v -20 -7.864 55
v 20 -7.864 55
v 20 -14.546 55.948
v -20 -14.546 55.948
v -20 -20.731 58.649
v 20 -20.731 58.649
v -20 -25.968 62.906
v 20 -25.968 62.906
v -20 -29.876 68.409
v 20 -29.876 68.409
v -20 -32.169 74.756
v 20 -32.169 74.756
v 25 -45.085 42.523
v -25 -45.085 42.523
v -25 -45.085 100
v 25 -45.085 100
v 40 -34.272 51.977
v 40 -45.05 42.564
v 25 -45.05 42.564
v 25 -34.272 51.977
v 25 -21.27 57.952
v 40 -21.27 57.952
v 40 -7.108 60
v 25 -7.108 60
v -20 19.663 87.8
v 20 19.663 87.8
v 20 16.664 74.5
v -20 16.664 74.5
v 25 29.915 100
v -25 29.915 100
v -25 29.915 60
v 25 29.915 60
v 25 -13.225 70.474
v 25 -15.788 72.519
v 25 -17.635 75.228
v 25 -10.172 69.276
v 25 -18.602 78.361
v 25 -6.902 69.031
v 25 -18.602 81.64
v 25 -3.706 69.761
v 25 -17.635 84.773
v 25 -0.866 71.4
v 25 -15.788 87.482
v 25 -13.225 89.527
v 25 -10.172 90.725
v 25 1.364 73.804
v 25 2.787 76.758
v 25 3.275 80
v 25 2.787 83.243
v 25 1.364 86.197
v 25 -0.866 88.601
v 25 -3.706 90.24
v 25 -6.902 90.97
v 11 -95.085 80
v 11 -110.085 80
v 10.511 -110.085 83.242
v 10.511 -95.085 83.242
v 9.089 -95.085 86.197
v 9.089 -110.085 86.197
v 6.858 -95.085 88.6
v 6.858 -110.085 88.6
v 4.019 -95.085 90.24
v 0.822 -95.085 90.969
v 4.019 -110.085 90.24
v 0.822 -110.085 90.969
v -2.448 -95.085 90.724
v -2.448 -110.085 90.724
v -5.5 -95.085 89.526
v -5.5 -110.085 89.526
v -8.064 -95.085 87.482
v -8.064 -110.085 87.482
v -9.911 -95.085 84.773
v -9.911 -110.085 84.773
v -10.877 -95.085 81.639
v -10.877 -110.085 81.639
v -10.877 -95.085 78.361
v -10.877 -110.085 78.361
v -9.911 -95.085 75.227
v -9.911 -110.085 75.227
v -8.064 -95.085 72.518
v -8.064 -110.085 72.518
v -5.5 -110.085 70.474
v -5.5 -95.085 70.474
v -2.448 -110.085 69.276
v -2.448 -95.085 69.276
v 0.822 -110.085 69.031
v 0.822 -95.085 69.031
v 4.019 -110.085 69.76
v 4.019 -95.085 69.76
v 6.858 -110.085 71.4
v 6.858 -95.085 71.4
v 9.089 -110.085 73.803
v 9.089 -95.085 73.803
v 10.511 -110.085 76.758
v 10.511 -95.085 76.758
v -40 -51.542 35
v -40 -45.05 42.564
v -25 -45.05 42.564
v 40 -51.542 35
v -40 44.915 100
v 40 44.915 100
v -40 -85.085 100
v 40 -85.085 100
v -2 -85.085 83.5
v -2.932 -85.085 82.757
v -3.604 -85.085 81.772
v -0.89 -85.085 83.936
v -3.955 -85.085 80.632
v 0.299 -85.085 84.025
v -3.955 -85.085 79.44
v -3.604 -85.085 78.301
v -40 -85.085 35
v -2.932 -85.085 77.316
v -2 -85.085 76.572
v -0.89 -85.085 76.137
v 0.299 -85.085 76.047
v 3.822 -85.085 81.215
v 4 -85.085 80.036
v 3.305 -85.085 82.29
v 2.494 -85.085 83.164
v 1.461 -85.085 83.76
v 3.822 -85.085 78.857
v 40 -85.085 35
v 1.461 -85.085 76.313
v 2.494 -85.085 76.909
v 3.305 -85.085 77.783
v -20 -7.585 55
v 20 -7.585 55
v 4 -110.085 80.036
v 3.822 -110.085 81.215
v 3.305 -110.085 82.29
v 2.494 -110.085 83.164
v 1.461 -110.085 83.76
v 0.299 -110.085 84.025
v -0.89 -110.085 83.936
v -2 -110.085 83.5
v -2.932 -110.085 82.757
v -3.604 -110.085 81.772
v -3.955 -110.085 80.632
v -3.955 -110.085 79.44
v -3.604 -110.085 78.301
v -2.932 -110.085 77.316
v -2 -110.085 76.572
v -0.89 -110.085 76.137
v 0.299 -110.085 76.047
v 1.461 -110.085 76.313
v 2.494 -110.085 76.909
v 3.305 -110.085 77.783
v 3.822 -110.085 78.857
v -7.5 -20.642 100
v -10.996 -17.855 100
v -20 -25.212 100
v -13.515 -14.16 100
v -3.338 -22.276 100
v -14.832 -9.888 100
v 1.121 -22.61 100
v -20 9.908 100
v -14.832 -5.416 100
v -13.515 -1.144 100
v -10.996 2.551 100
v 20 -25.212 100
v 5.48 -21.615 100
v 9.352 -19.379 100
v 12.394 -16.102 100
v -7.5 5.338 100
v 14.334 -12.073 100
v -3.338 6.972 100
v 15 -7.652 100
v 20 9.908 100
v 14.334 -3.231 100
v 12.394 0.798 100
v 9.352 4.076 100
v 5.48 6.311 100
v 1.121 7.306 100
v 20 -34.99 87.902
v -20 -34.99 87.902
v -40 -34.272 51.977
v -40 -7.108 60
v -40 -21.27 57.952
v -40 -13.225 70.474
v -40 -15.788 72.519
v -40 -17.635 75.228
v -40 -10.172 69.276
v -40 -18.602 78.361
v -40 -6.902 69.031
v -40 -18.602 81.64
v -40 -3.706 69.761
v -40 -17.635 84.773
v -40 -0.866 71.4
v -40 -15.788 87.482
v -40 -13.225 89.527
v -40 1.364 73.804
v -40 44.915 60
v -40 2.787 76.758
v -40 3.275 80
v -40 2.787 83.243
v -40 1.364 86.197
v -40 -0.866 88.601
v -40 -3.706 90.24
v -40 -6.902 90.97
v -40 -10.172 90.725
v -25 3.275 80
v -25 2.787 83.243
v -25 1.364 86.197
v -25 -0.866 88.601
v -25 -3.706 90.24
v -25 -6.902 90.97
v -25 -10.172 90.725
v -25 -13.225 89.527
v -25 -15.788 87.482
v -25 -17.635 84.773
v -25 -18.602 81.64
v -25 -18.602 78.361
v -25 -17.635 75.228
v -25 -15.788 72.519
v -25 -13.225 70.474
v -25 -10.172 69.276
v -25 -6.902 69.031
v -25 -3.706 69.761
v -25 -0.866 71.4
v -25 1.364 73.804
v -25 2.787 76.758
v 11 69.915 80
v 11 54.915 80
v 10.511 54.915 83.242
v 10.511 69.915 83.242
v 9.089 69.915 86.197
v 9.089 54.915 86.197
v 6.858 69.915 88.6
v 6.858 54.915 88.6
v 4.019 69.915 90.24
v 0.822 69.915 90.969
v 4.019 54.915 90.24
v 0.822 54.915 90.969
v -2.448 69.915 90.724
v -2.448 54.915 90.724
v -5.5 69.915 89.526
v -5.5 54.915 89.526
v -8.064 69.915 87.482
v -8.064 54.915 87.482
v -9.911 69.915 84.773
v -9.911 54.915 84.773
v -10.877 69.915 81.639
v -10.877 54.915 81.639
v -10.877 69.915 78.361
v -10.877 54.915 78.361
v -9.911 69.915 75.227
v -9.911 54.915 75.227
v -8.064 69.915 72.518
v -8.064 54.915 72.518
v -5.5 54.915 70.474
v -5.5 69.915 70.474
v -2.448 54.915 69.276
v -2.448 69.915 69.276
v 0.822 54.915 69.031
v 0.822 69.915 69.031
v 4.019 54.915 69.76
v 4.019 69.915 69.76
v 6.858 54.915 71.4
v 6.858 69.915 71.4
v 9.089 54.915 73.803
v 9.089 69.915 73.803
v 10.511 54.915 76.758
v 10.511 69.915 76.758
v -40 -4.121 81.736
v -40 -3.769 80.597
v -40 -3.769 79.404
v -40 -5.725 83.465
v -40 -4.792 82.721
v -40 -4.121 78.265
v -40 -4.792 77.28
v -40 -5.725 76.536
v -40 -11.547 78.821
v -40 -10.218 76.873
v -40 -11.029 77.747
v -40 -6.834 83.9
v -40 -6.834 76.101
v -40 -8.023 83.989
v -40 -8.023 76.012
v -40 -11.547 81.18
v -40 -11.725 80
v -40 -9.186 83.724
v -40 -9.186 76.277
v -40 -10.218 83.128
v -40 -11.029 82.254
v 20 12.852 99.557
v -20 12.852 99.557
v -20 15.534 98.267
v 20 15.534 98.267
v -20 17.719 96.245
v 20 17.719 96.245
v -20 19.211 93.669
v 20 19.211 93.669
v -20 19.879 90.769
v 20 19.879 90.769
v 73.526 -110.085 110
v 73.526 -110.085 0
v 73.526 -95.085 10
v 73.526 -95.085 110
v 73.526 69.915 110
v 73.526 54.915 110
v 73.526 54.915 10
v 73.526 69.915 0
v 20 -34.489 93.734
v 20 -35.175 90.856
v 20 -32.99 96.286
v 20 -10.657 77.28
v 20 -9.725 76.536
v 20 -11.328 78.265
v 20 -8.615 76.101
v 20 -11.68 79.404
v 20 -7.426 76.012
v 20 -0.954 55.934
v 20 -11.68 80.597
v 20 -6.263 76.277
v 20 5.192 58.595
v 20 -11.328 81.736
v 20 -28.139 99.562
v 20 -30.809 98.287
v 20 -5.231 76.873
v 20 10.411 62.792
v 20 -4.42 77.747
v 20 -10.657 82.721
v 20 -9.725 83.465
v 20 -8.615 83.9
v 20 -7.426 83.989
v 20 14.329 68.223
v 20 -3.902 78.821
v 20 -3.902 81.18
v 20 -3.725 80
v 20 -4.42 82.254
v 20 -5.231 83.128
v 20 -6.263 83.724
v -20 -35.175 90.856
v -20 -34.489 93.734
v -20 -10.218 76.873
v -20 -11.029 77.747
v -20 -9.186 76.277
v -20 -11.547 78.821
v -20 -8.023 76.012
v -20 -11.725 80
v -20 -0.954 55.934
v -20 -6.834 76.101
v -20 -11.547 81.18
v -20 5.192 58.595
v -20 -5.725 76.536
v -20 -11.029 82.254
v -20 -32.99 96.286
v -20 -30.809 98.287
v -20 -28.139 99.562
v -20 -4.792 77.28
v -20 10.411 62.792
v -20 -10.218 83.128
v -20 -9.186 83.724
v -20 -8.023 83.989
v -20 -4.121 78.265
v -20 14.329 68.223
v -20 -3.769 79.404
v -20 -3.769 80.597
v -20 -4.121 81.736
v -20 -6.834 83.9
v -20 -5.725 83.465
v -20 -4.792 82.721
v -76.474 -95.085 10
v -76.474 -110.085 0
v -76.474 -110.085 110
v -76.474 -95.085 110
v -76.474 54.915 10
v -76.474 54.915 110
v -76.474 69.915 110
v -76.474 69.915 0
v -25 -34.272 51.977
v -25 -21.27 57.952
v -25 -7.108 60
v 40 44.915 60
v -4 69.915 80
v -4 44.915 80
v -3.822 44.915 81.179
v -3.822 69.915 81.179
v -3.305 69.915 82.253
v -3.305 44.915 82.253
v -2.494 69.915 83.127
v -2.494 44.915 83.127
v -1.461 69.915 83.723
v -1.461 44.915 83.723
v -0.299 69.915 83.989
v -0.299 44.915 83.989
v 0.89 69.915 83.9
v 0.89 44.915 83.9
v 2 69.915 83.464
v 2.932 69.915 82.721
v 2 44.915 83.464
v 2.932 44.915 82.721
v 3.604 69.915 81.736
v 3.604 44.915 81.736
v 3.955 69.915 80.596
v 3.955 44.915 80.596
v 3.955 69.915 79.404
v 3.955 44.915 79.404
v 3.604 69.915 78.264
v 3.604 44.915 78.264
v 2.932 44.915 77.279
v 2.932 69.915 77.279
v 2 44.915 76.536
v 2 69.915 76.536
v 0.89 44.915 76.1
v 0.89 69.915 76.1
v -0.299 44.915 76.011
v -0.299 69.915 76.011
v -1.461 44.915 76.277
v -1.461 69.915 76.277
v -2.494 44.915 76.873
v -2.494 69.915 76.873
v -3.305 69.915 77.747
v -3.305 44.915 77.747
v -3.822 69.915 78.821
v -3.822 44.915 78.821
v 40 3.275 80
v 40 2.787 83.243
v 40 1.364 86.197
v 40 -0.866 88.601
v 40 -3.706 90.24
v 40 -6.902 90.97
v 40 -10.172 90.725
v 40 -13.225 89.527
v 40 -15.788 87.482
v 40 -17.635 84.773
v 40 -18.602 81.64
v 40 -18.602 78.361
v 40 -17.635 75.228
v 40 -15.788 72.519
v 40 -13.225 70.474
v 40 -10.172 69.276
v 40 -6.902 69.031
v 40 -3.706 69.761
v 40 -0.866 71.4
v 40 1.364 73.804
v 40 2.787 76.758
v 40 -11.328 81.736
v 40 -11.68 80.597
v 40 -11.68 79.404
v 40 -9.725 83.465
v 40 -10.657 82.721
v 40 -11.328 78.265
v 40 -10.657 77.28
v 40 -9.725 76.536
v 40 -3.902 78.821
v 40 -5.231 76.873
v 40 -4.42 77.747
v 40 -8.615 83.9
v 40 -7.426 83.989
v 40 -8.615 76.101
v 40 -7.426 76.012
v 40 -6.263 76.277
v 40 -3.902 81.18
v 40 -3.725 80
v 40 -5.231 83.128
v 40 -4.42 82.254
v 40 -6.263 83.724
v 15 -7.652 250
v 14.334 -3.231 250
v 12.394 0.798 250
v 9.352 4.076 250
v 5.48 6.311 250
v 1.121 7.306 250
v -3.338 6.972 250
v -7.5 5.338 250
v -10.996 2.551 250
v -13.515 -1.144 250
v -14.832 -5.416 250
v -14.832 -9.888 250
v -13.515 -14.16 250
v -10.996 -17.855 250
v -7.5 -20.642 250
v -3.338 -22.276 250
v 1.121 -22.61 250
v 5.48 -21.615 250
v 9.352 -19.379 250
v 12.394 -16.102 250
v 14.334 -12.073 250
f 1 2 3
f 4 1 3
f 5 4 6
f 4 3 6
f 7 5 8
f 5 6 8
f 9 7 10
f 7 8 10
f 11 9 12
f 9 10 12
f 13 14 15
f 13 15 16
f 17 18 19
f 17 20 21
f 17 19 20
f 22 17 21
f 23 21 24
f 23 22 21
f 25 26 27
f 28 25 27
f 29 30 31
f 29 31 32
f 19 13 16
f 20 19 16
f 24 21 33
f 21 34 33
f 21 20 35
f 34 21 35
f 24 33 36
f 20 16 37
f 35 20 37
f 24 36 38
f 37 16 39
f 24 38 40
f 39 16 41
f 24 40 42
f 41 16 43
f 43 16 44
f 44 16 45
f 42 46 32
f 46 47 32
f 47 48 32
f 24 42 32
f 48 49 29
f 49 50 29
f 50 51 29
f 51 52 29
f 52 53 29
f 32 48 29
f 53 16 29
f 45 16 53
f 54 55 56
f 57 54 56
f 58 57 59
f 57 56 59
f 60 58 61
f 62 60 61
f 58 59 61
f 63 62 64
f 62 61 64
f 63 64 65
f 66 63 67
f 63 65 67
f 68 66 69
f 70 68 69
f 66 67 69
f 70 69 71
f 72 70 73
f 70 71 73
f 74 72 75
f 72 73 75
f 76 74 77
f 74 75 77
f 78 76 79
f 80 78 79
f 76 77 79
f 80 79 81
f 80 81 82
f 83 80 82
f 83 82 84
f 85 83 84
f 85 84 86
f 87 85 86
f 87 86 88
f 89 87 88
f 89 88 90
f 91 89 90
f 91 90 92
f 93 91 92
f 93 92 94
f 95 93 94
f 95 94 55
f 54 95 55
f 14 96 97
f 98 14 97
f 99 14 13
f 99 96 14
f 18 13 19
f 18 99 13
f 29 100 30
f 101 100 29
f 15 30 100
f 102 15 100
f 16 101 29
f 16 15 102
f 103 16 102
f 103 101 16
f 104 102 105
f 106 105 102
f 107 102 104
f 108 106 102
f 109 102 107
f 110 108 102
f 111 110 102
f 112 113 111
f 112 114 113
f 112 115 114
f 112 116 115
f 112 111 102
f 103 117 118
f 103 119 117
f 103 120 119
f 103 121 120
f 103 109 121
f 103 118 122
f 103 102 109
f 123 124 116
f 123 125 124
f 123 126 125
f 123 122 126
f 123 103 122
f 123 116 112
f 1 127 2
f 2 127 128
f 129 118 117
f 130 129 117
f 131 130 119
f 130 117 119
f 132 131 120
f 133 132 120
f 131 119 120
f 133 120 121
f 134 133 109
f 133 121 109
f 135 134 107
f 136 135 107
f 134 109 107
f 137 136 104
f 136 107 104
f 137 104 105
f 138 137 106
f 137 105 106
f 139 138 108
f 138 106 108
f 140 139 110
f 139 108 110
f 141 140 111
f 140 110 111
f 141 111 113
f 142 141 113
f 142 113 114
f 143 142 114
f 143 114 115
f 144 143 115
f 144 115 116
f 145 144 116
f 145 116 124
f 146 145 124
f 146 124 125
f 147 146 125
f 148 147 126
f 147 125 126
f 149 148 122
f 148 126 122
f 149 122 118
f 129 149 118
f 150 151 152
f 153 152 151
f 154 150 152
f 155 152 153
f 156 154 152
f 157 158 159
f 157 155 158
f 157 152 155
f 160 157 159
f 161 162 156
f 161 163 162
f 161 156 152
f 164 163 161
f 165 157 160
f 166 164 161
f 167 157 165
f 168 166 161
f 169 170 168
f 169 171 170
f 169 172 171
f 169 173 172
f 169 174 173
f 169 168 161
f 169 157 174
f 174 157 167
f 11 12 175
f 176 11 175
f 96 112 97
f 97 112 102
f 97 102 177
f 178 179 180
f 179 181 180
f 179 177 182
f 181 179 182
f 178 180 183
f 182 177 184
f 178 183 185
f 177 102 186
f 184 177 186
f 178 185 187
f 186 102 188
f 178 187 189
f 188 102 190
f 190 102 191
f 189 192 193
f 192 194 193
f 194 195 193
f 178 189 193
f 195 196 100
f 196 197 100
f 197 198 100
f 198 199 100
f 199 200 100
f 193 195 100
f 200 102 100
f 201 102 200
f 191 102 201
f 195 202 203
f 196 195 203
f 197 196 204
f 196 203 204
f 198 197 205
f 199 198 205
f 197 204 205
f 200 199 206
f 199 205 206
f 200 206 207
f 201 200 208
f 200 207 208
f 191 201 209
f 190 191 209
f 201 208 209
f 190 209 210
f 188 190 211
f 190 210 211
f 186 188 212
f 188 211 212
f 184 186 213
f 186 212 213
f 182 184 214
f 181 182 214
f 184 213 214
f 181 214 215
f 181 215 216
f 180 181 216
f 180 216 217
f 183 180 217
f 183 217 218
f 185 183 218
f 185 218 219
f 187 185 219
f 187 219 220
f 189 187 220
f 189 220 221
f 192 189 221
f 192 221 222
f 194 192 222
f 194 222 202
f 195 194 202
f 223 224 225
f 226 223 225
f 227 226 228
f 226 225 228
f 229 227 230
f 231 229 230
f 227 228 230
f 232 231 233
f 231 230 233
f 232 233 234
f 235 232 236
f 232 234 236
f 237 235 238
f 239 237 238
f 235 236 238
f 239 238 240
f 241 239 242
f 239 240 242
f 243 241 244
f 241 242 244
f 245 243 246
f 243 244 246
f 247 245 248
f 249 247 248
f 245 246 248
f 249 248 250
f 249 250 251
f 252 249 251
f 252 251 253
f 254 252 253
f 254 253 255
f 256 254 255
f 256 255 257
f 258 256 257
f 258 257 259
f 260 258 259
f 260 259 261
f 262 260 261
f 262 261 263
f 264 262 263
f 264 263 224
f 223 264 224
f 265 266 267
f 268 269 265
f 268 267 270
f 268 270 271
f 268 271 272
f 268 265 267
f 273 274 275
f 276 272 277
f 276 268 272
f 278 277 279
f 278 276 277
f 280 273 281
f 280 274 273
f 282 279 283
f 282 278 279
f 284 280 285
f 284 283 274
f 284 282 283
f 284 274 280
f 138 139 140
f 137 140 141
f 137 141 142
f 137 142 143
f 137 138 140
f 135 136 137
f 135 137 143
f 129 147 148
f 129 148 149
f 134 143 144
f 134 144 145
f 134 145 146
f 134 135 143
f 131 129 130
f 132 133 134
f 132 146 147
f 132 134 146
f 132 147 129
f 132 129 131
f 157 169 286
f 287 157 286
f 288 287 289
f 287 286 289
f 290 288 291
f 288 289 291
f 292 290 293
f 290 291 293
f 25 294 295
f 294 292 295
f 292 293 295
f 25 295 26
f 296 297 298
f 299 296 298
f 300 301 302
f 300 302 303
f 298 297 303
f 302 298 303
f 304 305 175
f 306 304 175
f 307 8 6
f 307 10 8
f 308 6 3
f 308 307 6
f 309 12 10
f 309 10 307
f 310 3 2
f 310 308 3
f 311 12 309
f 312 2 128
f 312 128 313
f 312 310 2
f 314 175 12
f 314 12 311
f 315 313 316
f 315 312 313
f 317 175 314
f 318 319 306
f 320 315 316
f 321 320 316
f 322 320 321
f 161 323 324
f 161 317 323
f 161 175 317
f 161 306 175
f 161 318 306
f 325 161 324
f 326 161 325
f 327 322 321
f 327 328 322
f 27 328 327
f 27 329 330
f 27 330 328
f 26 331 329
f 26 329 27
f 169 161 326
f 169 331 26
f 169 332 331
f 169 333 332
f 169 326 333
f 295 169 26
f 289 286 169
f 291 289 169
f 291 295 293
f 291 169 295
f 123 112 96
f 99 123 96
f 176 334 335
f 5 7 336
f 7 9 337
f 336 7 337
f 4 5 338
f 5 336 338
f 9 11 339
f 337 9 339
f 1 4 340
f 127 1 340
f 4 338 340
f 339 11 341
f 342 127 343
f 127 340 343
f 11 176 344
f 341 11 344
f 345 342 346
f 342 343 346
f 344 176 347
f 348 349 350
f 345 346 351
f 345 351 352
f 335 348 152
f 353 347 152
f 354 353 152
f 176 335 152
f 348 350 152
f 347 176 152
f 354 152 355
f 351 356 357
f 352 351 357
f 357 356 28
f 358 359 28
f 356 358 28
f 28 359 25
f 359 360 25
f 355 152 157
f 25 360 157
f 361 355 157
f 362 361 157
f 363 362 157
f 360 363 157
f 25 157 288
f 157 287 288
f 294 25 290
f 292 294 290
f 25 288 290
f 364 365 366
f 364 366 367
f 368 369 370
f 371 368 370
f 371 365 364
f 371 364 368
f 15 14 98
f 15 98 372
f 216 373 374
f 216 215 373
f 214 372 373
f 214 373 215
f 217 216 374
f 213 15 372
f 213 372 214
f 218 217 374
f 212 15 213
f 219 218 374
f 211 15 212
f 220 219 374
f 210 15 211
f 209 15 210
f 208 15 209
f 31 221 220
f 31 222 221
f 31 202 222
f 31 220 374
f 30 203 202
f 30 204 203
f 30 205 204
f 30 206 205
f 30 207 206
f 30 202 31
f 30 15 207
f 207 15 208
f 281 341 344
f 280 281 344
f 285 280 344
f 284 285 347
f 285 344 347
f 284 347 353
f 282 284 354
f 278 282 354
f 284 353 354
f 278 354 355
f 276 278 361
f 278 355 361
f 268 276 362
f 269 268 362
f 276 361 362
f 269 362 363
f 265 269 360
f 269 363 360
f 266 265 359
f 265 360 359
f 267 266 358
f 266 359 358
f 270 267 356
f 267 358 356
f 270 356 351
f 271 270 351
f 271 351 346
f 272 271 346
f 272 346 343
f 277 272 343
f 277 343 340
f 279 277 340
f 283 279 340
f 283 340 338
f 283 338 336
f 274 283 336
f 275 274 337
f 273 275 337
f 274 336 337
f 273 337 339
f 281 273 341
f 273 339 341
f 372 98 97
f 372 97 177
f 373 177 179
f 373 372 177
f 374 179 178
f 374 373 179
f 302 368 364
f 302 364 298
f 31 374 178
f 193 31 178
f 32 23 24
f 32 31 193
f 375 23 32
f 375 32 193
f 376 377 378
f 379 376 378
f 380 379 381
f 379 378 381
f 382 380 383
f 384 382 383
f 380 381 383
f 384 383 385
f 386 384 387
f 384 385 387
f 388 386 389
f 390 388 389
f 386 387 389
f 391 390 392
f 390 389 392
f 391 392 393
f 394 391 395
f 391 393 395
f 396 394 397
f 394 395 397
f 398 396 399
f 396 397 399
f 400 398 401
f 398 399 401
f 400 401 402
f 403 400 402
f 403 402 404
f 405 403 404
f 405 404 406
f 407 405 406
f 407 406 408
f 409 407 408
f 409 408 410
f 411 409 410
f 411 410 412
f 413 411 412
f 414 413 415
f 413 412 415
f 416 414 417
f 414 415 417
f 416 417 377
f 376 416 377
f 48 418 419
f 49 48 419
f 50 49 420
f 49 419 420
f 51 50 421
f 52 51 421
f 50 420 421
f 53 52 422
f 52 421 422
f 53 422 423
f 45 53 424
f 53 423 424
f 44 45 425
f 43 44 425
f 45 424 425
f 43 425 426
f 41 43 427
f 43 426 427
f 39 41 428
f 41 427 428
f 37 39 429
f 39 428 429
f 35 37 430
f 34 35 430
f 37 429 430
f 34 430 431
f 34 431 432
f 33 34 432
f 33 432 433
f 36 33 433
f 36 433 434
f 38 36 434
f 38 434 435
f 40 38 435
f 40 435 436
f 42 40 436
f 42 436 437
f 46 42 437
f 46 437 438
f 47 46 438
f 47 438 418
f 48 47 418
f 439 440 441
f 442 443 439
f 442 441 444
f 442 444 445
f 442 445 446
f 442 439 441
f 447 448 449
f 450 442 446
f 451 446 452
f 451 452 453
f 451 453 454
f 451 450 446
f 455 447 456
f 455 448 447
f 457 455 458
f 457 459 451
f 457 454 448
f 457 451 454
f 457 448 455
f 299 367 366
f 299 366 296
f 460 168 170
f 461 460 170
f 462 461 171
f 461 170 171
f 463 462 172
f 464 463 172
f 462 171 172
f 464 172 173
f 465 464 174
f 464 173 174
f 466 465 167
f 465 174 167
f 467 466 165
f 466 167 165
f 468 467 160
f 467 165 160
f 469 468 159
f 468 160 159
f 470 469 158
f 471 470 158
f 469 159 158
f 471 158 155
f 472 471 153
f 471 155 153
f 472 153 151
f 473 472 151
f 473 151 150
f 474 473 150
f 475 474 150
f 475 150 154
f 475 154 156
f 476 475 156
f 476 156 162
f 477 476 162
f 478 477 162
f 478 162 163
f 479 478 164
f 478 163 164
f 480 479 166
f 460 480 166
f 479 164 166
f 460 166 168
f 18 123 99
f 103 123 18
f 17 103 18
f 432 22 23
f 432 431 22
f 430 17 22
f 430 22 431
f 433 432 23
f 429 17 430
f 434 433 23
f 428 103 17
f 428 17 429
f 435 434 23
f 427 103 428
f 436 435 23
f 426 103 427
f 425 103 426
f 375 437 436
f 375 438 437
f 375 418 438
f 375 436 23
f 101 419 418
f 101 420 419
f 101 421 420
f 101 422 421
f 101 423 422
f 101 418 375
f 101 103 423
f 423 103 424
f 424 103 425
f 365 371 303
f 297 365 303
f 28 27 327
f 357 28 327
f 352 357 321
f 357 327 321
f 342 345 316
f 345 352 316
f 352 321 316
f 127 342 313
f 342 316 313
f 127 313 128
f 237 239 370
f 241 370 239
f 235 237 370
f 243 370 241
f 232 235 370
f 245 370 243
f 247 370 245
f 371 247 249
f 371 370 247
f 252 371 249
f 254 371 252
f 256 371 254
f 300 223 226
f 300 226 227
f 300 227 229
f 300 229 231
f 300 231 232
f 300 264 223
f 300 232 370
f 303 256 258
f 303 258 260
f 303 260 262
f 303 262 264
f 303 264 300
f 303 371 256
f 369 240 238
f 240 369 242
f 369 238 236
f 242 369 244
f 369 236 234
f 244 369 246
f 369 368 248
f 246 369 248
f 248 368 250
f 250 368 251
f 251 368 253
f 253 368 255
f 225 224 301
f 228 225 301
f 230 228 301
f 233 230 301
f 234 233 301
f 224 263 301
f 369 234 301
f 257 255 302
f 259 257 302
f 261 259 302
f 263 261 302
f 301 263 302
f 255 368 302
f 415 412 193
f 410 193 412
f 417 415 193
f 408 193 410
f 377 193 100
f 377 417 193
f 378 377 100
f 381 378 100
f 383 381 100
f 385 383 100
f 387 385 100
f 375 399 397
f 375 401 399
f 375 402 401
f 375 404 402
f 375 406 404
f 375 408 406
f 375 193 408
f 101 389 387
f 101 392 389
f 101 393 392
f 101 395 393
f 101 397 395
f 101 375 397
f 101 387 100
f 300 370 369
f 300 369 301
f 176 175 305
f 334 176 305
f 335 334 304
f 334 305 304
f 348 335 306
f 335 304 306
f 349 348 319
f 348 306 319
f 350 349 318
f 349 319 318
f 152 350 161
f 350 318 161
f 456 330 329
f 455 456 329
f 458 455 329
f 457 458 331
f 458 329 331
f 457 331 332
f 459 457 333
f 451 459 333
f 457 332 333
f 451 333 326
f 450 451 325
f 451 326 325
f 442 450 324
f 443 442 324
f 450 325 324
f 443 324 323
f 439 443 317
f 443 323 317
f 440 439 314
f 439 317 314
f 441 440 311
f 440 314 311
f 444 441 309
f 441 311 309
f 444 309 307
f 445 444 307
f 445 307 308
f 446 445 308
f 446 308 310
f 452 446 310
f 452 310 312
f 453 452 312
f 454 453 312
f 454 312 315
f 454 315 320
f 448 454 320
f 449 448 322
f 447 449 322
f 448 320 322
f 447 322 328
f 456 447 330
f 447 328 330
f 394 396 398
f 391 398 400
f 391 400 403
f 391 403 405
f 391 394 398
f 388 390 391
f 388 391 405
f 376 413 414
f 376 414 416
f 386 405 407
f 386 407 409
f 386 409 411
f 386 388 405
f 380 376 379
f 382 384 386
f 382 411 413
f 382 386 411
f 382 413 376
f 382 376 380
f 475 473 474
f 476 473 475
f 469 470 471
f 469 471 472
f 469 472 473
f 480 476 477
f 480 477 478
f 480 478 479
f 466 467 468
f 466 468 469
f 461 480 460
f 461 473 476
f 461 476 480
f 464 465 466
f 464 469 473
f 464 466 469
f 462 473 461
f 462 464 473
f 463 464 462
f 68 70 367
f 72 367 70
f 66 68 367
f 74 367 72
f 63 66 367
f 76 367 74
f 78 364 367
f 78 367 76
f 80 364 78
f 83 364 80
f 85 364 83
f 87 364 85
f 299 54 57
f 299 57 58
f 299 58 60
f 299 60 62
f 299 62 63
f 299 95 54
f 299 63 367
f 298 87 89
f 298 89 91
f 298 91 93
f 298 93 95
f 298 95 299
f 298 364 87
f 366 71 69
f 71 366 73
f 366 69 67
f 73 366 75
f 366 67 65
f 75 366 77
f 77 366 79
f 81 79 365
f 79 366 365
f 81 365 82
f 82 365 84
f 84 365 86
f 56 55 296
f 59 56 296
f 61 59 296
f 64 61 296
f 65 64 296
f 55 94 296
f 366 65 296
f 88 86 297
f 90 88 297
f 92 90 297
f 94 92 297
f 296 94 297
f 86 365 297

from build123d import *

# Parameters (mm, degrees)
F0_W      = 150
F0_H      = 180
F1_DEPTH  = 10
F2_W      = 150
F2_H      = 15
F3_DEPTH  = 100
F5_D      = 22
F7_DEPTH  = 40
F9_R      = 4
F10_DEPTH = 25
F11_R     = 4
F12_DEPTH = 25
F13_W     = 50
F13_H     = 75
F14_DEPTH = 65.278
F16_R     = 11
F17_DEPTH = 87.122
F19_W     = 40
F19_H     = 60
F20_DEPTH = 45
F22_DEPTH = 42.672
F23_R     = 4
F24_DEPTH = 20
F25_R     = 4
F26_DEPTH = 20
F27_R     = 15
F28_DEPTH = 150


with BuildPart() as f1:
    # F0 (on Top) → F1 (new body)
    with BuildSketch(Plane.XY):
        with Locations((-1.474342, -20.085204)):
            Rectangle(F0_W, F0_H)
    extrude(amount=F1_DEPTH)

    # F2 (on face) → F3 (join)
    with BuildSketch(Plane.XY.offset(10)):
        with Locations((-1.474342, 62.414796)):
            Rectangle(F2_W, F2_H)
        with Locations((-1.474342, -102.585204)):
            Rectangle(F2_W, F2_H)
    extrude(amount=F3_DEPTH)

    # F5 (through all)
    with Locations(Plane(origin=(0, 69.914796, 0), x_dir=(-1, 0, 0), z_dir=(0, 1, 0))):
        with Locations((0, 80)):
            Hole(F5_D / 2)


with BuildPart() as f7:
    # F6 (on Right) → F7 (new body)
    with BuildSketch(Plane.YZ):
        with BuildLine():
            Line((44.914796, 100), (-85.085204, 100))
            Line((-85.085204, 100), (-85.085204, 35))
            Line((-85.085204, 35), (-51.542021, 35))
            Line((-51.542021, 35), (-45.049812, 42.564274))
            ThreePointArc((-45.049812, 42.564274), (-27.986226, 55.432443), (-7.108171, 60))
            Line((-7.108171, 60), (44.914796, 60))
            Line((44.914796, 60), (44.914796, 100))
        make_face()
    extrude(amount=F7_DEPTH)

    # F8: F7 across plane


with BuildPart() as f7_1:
    add(f7.part)
    add(f7.part.mirror(Plane.YZ))

    # F9 (on face) → F10 (join)
    with BuildSketch(Plane.XZ.offset(85.085204)):
        with Locations((0, 80.03625)):
            Circle(F9_R)
    extrude(amount=F10_DEPTH)

    # F11 (on face) → F12 (join)
    with BuildSketch(Plane(origin=(0, 44.914796, 0), x_dir=(-1, 0, 0), z_dir=(0, 1, 0))):
        with Locations((0, 80)):
            Circle(F11_R)
    extrude(amount=F12_DEPTH)

    # F13 (on face) → F14 (cut)
    with BuildSketch(Plane.XY.offset(100)):
        with Locations((0, -7.585204)):
            Rectangle(F13_W, F13_H)
    extrude(amount=-F14_DEPTH, mode=Mode.SUBTRACT)

    # F16 (on face) → F17 (cut)
    with BuildSketch(Plane.YZ.offset(40)):
        with Locations((-7.724516, 80.000485)):
            Circle(F16_R)
    extrude(amount=-F17_DEPTH, mode=Mode.SUBTRACT)


with BuildPart() as f20:
    # F19 (on face) → F20 (new body)
    with BuildSketch(Plane.XY.offset(100)):
        with Locations((0, -7.585204)):
            Rectangle(F19_W, F19_H)
    extrude(amount=-F20_DEPTH)

    # F21 (on face) → F22 (cut)
    with BuildSketch(Plane.YZ.offset(20)):
        with BuildLine():
            Line((19.663312, 87.799952), (16.663805, 74.500173))
            ThreePointArc((16.663805, 74.500173), (7.942819, 60.517717), (-7.585204, 55))
            Line((-7.585204, 55), (22.414796, 55))
            Line((22.414796, 55), (22.414796, 100))
            Line((22.414796, 100), (9.908324, 100))
            ThreePointArc((9.908324, 100), (17.718589, 96.244979), (19.663312, 87.799952))
        make_face()
        with BuildLine():
            ThreePointArc((-7.863828, 55), (-23.49367, 60.600036), (-32.169111, 74.755921))
            Line((-32.169111, 74.755921), (-34.989643, 87.902247))
            ThreePointArc((-34.989643, 87.902247), (-32.989599, 96.285796), (-25.212147, 100))
            Line((-25.212147, 100), (-37.585204, 100))
            Line((-37.585204, 100), (-37.585204, 55))
            Line((-37.585204, 55), (-7.863828, 55))
        make_face()
    extrude(amount=-F22_DEPTH, mode=Mode.SUBTRACT)

    # F23 (on face) → F24 (join)
    with BuildSketch(Plane.YZ.offset(20)):
        with Locations((-7.724516, 80.000485)):
            Circle(F23_R)
    extrude(amount=F24_DEPTH)

    # F25 (on face) → F26 (join)
    with BuildSketch(Plane(origin=(-20, 0, 0), x_dir=(0, -1, 0), z_dir=(-1, 0, 0))):
        with Locations((7.724516, 80.000485)):
            Circle(F25_R)
    extrude(amount=F26_DEPTH)

    # F27 (on face) → F28 (join)
    with BuildSketch(Plane.XY.offset(100)):
        with Locations((0, -7.651911)):
            Circle(F27_R)
    extrude(amount=F28_DEPTH)


solid = Compound([f1.part, f7_1.part, f20.part])
